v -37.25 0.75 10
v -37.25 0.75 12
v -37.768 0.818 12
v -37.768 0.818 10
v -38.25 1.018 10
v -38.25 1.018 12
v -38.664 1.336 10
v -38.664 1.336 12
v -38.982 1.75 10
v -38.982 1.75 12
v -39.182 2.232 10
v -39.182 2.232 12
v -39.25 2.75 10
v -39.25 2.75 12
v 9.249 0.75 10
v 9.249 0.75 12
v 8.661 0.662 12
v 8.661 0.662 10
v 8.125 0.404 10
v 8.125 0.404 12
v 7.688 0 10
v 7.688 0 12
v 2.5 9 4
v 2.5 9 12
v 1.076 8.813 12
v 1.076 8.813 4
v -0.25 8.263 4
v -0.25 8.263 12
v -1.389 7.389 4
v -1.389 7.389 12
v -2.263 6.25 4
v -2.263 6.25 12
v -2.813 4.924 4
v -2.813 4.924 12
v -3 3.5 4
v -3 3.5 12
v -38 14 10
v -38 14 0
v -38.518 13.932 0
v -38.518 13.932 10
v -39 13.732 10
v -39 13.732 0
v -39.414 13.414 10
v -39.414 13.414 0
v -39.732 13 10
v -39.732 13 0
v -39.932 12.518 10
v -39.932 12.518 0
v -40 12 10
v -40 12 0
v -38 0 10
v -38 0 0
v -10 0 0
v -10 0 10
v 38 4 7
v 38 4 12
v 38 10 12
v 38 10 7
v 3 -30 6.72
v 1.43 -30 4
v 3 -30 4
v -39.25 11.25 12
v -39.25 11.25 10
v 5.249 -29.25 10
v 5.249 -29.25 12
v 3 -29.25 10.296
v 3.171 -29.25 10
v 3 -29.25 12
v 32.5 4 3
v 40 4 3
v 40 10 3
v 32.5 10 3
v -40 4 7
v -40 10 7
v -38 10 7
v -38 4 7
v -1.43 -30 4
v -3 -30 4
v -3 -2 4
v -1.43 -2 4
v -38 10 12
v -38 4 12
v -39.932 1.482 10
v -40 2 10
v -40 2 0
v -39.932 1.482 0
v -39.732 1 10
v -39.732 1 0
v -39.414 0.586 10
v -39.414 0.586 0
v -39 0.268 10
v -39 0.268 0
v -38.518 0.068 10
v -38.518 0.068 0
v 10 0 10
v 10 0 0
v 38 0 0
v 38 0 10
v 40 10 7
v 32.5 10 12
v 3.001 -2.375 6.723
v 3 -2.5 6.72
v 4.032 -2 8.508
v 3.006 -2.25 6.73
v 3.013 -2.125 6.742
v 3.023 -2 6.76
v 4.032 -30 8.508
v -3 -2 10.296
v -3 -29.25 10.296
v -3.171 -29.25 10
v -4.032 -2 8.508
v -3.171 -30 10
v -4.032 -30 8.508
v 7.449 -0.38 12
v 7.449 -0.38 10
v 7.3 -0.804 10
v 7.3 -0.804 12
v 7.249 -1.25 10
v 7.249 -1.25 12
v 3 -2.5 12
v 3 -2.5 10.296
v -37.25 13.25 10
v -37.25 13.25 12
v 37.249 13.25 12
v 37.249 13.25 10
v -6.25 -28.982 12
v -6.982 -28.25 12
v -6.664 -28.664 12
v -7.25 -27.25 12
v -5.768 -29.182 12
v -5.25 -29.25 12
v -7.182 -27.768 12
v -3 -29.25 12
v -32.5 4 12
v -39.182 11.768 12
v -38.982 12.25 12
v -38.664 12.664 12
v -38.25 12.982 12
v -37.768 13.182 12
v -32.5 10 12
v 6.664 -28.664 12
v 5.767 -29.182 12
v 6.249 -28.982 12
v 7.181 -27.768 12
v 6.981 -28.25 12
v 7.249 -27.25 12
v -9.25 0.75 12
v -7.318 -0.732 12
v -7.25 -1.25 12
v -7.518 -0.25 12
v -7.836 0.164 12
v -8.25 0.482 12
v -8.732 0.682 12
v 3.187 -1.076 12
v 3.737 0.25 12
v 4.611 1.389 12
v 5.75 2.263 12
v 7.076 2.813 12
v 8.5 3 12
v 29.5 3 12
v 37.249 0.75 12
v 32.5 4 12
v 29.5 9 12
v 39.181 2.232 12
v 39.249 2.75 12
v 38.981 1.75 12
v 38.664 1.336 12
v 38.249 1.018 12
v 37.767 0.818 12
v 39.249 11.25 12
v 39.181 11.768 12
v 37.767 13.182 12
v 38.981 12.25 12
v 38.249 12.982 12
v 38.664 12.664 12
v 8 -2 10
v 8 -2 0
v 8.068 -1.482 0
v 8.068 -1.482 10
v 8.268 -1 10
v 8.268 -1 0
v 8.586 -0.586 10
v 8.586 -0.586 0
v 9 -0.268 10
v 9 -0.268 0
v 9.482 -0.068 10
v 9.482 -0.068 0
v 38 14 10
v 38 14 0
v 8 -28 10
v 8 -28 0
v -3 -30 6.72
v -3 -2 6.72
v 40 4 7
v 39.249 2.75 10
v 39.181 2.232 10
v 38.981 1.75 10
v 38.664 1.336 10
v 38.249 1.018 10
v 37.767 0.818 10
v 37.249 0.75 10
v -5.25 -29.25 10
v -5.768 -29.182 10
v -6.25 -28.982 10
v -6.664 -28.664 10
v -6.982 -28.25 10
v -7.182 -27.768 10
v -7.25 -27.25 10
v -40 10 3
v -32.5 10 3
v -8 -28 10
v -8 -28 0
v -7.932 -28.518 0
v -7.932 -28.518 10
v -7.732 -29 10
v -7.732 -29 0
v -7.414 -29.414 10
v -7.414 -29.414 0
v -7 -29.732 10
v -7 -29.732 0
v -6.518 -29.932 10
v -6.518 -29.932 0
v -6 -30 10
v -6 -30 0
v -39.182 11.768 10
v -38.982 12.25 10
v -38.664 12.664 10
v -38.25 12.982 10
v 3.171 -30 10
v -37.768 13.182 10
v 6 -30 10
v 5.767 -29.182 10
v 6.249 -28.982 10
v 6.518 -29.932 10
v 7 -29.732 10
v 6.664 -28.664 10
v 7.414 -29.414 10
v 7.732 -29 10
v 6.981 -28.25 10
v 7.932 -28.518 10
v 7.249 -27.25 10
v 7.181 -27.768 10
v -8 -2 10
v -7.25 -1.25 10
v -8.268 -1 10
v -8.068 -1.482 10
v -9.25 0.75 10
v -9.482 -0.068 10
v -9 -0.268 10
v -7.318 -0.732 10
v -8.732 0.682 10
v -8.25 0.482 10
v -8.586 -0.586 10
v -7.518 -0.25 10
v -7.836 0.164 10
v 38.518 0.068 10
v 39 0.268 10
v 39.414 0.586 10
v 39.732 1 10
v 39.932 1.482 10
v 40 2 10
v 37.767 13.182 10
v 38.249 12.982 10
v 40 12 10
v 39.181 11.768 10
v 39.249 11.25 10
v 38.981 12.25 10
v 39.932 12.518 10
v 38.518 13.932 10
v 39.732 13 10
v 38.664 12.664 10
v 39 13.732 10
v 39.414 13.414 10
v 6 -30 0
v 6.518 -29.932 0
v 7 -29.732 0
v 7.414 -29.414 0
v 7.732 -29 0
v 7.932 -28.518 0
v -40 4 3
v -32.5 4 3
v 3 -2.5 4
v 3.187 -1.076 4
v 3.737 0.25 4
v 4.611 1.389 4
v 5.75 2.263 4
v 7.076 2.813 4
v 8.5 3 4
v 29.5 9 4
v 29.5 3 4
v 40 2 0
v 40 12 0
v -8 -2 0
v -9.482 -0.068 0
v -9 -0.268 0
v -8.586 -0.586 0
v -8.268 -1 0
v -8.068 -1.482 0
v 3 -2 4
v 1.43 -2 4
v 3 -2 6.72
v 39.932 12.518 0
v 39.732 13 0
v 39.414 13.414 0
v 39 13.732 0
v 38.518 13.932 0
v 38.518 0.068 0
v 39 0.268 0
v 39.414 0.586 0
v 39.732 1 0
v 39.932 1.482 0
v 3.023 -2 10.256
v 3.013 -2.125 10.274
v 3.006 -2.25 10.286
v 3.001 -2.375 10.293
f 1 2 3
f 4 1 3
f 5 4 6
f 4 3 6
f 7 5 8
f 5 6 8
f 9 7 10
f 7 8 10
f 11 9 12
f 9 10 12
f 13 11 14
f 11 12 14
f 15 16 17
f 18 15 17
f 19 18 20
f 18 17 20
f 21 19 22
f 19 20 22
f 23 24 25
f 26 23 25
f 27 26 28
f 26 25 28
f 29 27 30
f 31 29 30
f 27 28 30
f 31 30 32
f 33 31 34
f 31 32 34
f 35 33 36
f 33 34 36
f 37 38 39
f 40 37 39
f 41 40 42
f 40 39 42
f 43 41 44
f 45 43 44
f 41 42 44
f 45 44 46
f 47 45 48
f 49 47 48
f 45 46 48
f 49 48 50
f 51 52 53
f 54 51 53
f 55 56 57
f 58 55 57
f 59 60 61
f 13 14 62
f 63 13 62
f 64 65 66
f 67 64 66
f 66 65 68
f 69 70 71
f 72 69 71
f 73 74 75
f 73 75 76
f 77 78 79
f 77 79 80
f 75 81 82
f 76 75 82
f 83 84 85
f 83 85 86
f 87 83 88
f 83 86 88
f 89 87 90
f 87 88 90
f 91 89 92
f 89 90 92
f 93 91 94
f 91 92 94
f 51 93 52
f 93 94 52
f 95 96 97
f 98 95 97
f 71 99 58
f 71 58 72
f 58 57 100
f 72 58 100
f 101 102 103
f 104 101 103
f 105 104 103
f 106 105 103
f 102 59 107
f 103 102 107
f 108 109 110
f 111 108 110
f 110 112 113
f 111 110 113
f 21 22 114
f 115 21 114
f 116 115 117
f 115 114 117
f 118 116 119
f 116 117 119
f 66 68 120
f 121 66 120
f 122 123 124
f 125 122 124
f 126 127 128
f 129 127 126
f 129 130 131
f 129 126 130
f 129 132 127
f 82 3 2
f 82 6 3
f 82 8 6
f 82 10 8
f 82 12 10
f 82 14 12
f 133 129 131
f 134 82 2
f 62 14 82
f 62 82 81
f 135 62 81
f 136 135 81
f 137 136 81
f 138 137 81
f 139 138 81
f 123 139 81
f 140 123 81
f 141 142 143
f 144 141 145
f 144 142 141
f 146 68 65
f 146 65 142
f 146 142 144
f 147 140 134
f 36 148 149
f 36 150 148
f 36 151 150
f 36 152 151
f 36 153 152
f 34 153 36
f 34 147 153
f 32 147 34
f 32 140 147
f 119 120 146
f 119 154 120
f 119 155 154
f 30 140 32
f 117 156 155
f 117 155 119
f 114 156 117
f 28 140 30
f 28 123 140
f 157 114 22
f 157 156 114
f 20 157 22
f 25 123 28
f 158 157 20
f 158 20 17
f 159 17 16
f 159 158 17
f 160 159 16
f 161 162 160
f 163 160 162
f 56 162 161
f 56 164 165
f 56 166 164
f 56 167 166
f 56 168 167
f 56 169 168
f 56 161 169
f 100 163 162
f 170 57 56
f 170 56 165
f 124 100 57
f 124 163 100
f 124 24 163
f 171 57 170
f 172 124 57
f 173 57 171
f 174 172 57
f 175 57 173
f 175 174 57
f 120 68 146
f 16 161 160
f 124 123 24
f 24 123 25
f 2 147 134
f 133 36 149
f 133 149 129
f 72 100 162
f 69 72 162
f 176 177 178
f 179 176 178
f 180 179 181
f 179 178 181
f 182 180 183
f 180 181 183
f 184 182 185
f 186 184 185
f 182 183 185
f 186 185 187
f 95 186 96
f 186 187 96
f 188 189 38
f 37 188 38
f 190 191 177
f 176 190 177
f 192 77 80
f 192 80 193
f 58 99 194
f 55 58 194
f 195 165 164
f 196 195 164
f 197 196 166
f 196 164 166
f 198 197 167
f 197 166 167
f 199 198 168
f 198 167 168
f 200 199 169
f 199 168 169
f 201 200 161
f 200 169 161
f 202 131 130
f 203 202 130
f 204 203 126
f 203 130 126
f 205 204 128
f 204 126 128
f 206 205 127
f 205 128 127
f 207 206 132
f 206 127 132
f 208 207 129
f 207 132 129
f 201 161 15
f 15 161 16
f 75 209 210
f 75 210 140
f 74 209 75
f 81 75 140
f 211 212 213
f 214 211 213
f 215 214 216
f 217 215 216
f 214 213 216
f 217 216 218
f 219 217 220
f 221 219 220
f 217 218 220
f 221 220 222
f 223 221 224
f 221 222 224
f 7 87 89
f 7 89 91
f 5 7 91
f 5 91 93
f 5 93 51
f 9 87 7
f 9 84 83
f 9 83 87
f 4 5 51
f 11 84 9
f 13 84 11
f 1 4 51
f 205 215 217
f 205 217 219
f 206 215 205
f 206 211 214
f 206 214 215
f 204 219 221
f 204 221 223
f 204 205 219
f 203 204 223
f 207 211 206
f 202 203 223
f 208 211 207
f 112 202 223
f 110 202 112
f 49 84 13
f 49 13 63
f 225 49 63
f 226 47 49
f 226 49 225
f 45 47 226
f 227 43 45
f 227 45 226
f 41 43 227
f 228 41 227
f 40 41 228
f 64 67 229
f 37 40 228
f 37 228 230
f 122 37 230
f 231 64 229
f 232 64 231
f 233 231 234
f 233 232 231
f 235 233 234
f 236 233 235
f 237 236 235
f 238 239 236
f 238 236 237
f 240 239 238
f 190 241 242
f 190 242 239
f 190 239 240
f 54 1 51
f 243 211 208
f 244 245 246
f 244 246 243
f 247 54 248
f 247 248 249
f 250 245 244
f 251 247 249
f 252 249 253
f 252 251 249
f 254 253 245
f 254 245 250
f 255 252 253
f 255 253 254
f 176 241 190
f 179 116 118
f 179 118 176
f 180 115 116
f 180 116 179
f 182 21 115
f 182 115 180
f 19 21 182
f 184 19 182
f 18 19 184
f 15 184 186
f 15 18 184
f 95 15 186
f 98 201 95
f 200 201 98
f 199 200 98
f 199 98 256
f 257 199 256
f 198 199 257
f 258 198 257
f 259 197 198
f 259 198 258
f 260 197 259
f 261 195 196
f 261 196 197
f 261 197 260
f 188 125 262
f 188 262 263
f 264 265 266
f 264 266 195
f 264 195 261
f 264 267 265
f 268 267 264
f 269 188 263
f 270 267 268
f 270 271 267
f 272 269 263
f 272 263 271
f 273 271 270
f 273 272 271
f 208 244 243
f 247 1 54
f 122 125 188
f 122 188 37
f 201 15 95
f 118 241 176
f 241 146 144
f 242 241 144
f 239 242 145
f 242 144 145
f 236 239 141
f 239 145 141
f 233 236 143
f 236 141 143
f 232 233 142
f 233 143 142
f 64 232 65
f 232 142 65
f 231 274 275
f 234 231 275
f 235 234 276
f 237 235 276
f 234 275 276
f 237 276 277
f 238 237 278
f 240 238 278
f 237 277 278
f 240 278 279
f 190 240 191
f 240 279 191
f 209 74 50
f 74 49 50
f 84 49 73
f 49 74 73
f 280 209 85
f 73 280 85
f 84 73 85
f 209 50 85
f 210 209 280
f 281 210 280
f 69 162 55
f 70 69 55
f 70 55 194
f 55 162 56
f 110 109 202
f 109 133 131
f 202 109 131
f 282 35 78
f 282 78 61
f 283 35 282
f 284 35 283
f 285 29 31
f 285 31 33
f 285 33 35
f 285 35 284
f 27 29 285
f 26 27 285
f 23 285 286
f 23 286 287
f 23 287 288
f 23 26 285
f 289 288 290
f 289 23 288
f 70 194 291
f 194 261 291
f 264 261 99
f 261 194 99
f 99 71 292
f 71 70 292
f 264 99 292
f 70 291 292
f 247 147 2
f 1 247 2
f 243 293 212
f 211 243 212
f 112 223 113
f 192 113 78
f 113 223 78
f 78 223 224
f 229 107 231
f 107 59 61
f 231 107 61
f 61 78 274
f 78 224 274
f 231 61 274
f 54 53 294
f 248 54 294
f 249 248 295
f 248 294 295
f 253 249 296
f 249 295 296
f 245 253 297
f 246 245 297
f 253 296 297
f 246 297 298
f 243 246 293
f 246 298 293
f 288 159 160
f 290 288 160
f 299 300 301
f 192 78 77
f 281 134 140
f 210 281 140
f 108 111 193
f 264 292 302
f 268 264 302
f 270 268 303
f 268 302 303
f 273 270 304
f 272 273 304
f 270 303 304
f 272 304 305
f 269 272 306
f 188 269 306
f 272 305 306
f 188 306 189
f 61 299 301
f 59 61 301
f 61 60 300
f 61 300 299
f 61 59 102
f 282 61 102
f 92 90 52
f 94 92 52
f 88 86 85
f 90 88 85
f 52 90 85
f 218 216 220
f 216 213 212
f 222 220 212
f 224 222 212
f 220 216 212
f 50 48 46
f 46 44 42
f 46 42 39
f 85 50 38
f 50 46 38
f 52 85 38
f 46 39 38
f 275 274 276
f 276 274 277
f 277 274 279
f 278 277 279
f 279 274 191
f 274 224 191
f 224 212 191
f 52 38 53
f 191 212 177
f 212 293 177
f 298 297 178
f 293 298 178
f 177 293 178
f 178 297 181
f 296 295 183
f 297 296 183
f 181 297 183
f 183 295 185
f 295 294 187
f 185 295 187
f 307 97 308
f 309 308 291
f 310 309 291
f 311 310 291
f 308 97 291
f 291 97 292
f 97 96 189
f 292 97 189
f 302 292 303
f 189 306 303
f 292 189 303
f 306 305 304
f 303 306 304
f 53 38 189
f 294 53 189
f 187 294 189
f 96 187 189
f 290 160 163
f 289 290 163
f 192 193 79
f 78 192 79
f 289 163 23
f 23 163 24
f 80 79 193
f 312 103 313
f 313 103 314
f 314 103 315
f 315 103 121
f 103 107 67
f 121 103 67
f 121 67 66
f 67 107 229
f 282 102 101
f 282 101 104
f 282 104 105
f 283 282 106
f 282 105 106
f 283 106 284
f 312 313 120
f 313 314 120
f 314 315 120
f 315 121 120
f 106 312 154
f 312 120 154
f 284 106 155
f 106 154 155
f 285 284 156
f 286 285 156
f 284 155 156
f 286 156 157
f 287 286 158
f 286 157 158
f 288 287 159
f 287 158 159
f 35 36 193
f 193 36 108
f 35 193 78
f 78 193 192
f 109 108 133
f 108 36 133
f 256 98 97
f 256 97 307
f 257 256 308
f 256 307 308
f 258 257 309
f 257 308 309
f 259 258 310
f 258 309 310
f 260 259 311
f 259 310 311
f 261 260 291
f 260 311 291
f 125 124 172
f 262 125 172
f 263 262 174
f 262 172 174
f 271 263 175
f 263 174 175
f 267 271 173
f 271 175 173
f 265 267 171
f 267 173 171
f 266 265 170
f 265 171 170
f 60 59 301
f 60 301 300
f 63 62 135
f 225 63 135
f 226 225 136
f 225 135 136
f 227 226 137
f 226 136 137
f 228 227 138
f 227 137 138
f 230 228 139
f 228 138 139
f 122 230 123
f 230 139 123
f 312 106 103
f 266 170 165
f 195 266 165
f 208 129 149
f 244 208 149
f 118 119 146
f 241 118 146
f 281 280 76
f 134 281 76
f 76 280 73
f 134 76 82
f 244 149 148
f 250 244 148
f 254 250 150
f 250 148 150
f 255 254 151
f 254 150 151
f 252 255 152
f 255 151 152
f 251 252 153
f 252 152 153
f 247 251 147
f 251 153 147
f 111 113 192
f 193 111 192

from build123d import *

# Parameters (mm, degrees)
F1_DEPTH  = 12
F3_DEPTH  = 8
F5_DEPTH  = 28
F7_DEPTH  = 28
F9_DEPTH  = 8
F11_DEPTH = 7.5
F12_W     = 6
F12_H     = 4
F13_DEPTH = 7.5
F15_DEPTH = 2


with BuildPart() as f1:
    # F0 (on Top) → F1 (new body)
    with BuildSketch(Plane.XY):
        with BuildLine():
            Line((0, 0), (10, 0))
            Line((10, 0), (35, 0))
            ThreePointArc((35, 0), (36.414214, 0.585786), (37, 2))
            Line((37, 2), (37, 12))
            ThreePointArc((37, 12), (36.414214, 13.414214), (35, 14))
            Line((35, 14), (-35, 14))
            ThreePointArc((-35, 14), (-36.414214, 13.414214), (-37, 12))
            Line((-37, 12), (-37, 2))
            ThreePointArc((-37, 2), (-36.414214, 0.585786), (-35, 0))
            Line((-35, 0), (-10, 0))
            Line((-10, 0), (0, 0))
        make_face()
        with BuildLine():
            Line((-38, 0), (-35, 0))
            ThreePointArc((-35, 0), (-36.414214, 0.585786), (-37, 2))
            Line((-37, 2), (-37, 12))
            ThreePointArc((-37, 12), (-36.414214, 13.414214), (-35, 14))
            Line((-35, 14), (-38, 14))
            ThreePointArc((-38, 14), (-39.414214, 13.414214), (-40, 12))
            Line((-40, 12), (-40, 2))
            ThreePointArc((-40, 2), (-39.414214, 0.585786), (-38, 0))
        make_face()
        with BuildLine():
            ThreePointArc((37, 2), (36.414214, 0.585786), (35, 0))
            Line((35, 0), (38, 0))
            ThreePointArc((38, 0), (39.414214, 0.585786), (40, 2))
            Line((40, 2), (40, 12))
            ThreePointArc((40, 12), (39.414214, 13.414214), (38, 14))
            Line((38, 14), (35, 14))
            ThreePointArc((35, 14), (36.414214, 13.414214), (37, 12))
            Line((37, 12), (37, 2))
        make_face()
        with BuildLine():
            ThreePointArc((8, -2), (8.585786, -0.585786), (10, 0))
            Line((10, 0), (0, 0))
            Line((0, 0), (-10, 0))
            ThreePointArc((-10, 0), (-8.585786, -0.585786), (-8, -2))
            Line((-8, -2), (-8, -28))
            ThreePointArc((-8, -28), (-7.414214, -29.414214), (-6, -30))
            Line((-6, -30), (6, -30))
            ThreePointArc((6, -30), (7.414214, -29.414214), (8, -28))
            Line((8, -28), (8, -2))
        make_face()
    extrude(amount=F1_DEPTH)

    # F2 (on face) → F3 (cut)
    with BuildSketch(Plane.XY.offset(12)):
        with BuildLine():
            Line((29.5, 3), (29.5, 9))
            Line((29.5, 9), (2.5, 9))
            ThreePointArc((2.5, 9), (-1.389087, 7.389087), (-3, 3.5))
            Line((-3, 3.5), (-3, -30))
            Line((-3, -30), (3, -30))
            Line((3, -30), (3, -2.5))
            ThreePointArc((3, -2.5), (4.610913, 1.389087), (8.5, 3))
            Line((8.5, 3), (29.5, 3))
        make_face()
    extrude(amount=-F3_DEPTH, mode=Mode.SUBTRACT)

    # F4 (on face) → F5 (cut)
    with BuildSketch(Plane.XZ.offset(30)):
        Polygon((-2.016117, 5.015964), (2.016117, 5.015964), (4.032235, 8.507982), (2.016117, 12), (-2.016117, 12), (-4.032235, 8.507982), align=None)
    extrude(amount=-F5_DEPTH, mode=Mode.SUBTRACT)

    # F8 (on face) → F9 (cut)
    with BuildSketch(Plane.XY.offset(12)):
        Polygon((32.5, 4), (35, 4), (38, 4), (38, 10), (35, 10), (33, 10), (32.5, 10), (32.5, 4.626769), align=None)
        Polygon((-38, 4), (-35, 4), (-33, 4), (-32.5, 4), (-32.5, 10), (-33, 10), (-35, 10), (-38, 10), align=None)
    extrude(amount=-F9_DEPTH, mode=Mode.SUBTRACT)

    # F10 (on face) → F11 (cut, through all)
    with BuildSketch(Plane.YZ.offset(40)):
        Polygon((10, 7), (4, 7), (4, 4), (4, 3), (10, 3), (10, 4), (10, 5), align=None)
    extrude(amount=-F11_DEPTH, mode=Mode.SUBTRACT)

    # F12 (on face) → F13 (cut, through all)
    with BuildSketch(Plane(origin=(-40, 0, 0), x_dir=(0, -1, 0), z_dir=(-1, 0, 0))):
        with Locations((-7, 5)):
            Rectangle(F12_W, F12_H)
    extrude(amount=-F13_DEPTH, mode=Mode.SUBTRACT)

    # F14 (on face) → F15 (cut)
    with BuildSketch(Plane.XY.offset(12)):
        with BuildLine():
            Line((5.249343, -29.25), (0, -29.25))
            Line((0, -29.25), (0, -30))
            Line((0, -30), (4.179587, -30))
            Line((4.179587, -30), (6, -30))
            ThreePointArc((6, -30), (7.414214, -29.414214), (8, -28))
            Line((8, -28), (8, -6.407865))
            Line((8, -6.407865), (8, -2))
            ThreePointArc((8, -2), (8.585786, -0.585786), (10, 0))
            Line((10, 0), (7.688094, 0))
            ThreePointArc((7.688094, 0), (7.362216, -0.587618), (7.249343, -1.25))
            Line((7.249343, -1.25), (7.249343, -27.25))
            ThreePointArc((7.249343, -27.25), (6.663557, -28.664214), (5.249343, -29.25))
        make_face()
        with BuildLine():
            Line((0, -30), (0, -29.25))
            Line((0, -29.25), (-5.25, -29.25))
            ThreePointArc((-5.25, -29.25), (-6.664214, -28.664214), (-7.25, -27.25))
            Line((-7.25, -27.25), (-7.25, -1.25))
            ThreePointArc((-7.25, -1.25), (-7.835786, 0.164214), (-9.25, 0.75))
            Line((-9.25, 0.75), (-32.738585, 0.75))
            Line((-32.738585, 0.75), (-37.25, 0.75))
            ThreePointArc((-37.25, 0.75), (-38.664214, 1.335786), (-39.25, 2.75))
            Line((-39.25, 2.75), (-39.25, 11.25))
            ThreePointArc((-39.25, 11.25), (-38.664214, 12.664214), (-37.25, 13.25))
            Line((-37.25, 13.25), (37.249343, 13.25))
            ThreePointArc((37.249343, 13.25), (38.663557, 12.664214), (39.249343, 11.25))
            Line((39.249343, 11.25), (39.249343, 2.75))
            ThreePointArc((39.249343, 2.75), (38.663557, 1.335786), (37.249343, 0.75))
            Line((37.249343, 0.75), (9.249343, 0.75))
            ThreePointArc((9.249343, 0.75), (8.383318, 0.552776), (7.688094, 0))
            Line((7.688094, 0), (10, 0))
            Line((10, 0), (38, 0))
            ThreePointArc((38, 0), (39.414214, 0.585786), (40, 2))
            Line((40, 2), (40, 12))
            ThreePointArc((40, 12), (39.414214, 13.414214), (38, 14))
            Line((38, 14), (-38, 14))
            ThreePointArc((-38, 14), (-39.414214, 13.414214), (-40, 12))
            Line((-40, 12), (-40, 2))
            ThreePointArc((-40, 2), (-39.414214, 0.585786), (-38, 0))
            Line((-38, 0), (-32.738585, 0))
            Line((-32.738585, 0), (-10, 0))
            ThreePointArc((-10, 0), (-8.585786, -0.585786), (-8, -2))
            Line((-8, -2), (-8, -28))
            ThreePointArc((-8, -28), (-7.414214, -29.414214), (-6, -30))
            Line((-6, -30), (0, -30))
        make_face()
    extrude(amount=-F15_DEPTH, mode=Mode.SUBTRACT)


with BuildPart() as f7:
    # F6 (on face) → F7 (new body)
    with BuildSketch(Plane.XZ.offset(30)):
        Polygon((-1.42955, 4), (-3, 6.720099), (-3, 4), align=None)
        Polygon((3, 4), (3, 6.720099), (1.42955, 4), align=None)
    extrude(amount=-F7_DEPTH)


solid = Compound([f1.part, f7.part])
